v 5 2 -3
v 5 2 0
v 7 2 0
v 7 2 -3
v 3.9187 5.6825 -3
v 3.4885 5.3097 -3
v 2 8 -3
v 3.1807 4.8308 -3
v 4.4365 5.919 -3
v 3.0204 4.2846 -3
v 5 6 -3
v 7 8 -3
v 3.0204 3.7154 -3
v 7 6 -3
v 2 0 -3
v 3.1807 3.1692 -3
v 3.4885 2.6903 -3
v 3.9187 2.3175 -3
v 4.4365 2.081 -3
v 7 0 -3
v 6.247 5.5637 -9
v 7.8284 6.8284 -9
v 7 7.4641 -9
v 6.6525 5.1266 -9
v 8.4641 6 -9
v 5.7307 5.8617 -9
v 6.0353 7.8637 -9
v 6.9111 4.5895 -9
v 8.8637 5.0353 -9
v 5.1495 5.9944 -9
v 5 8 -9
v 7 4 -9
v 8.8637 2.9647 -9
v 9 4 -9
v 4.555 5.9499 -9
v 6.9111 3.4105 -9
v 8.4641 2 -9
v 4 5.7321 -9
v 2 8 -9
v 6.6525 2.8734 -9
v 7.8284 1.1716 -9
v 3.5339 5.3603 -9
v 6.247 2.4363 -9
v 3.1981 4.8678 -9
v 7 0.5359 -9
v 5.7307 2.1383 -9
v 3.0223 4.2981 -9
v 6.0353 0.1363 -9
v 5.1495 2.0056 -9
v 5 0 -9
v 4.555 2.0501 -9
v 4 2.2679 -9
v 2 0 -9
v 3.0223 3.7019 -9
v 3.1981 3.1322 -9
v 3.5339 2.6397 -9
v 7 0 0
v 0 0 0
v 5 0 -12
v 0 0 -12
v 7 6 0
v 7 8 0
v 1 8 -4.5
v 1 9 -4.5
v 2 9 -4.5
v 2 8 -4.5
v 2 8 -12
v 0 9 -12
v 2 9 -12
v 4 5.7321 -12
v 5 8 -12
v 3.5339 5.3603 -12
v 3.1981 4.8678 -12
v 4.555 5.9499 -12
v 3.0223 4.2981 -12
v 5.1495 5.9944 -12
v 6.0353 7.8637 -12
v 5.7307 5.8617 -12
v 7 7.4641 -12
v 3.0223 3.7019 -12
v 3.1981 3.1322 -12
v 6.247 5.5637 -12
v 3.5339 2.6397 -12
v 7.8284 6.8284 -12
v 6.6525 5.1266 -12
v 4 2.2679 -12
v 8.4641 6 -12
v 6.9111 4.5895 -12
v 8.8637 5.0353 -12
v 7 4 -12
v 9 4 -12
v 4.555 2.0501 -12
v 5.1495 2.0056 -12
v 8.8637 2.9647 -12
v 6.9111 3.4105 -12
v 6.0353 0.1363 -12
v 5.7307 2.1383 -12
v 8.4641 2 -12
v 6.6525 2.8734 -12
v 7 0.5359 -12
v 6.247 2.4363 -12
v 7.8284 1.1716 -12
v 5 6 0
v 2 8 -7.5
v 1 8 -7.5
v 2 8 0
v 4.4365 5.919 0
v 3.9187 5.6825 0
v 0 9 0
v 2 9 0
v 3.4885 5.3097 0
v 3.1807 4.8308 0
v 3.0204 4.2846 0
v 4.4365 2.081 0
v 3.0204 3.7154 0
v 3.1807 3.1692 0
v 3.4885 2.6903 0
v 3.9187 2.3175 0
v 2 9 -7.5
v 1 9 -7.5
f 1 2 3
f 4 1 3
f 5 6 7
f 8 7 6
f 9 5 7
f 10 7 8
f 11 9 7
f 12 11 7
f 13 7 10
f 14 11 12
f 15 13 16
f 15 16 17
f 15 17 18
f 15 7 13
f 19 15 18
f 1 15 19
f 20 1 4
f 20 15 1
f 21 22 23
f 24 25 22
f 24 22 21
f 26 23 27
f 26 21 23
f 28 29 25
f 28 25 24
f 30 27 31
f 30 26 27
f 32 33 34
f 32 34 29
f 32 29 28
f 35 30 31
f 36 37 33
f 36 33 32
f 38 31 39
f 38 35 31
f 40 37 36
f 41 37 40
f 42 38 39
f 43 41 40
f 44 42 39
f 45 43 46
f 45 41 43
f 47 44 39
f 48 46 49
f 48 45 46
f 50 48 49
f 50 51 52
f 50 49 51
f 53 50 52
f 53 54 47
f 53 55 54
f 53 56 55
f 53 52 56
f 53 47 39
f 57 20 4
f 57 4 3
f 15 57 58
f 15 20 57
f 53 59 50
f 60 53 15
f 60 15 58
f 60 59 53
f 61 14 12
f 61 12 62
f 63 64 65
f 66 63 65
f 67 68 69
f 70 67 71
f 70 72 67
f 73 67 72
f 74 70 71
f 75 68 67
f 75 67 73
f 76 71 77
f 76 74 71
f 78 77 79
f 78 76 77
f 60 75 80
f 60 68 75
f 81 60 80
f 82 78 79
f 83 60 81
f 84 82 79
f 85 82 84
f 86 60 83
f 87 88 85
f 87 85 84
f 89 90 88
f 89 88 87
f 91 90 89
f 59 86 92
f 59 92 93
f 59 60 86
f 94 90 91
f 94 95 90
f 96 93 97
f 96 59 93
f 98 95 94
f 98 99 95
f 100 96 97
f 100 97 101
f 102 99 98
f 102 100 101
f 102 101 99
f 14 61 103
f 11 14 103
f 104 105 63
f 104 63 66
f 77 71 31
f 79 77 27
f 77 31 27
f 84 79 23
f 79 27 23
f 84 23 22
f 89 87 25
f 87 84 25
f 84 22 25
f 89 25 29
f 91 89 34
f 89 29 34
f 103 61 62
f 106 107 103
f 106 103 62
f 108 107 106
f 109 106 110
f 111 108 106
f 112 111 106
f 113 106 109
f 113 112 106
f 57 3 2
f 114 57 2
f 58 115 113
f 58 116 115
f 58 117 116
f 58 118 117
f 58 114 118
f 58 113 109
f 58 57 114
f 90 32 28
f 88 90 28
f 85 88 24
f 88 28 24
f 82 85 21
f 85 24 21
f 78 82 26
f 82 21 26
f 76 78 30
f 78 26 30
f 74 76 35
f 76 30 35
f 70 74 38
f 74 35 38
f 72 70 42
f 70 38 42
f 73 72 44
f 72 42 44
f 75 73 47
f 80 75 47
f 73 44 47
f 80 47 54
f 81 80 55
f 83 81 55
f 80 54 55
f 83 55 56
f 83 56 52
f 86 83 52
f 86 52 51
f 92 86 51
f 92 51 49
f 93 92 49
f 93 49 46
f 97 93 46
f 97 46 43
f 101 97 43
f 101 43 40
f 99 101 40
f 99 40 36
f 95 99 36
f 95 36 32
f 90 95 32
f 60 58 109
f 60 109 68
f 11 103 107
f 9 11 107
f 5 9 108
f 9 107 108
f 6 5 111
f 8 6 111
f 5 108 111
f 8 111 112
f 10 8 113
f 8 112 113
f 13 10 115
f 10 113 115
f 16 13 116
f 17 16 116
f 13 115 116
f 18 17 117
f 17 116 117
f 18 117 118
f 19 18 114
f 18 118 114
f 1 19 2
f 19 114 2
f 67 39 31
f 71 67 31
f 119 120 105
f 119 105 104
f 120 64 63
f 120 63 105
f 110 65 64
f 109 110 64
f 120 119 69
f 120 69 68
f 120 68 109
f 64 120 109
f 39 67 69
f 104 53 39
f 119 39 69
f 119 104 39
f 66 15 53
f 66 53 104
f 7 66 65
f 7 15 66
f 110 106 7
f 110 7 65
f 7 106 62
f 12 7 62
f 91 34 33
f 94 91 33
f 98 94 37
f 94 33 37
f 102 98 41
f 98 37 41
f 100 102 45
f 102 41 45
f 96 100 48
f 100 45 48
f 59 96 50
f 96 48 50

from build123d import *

# Parameters (mm, degrees)
BOSS_EXTRUDE1_DEPTH = 9
SKETCH3_R           = 2
SKETCH3_W           = 7
SKETCH3_H           = 1
CUT_EXTRUDE4_DEPTH  = 8
SKETCH4_W           = 1
SKETCH4_H           = 3
CUT_EXTRUDE5_DEPTH  = 1
SKETCH5_R           = 2
CUT_EXTRUDE6_DEPTH  = 11


with BuildPart() as part:
    # Sketch2 → Boss-Extrude1 (new body)
    with BuildSketch(Plane(origin=(0, 0, 0), x_dir=(1, 0, 0), z_dir=(0, 1, 0))):
        Polygon((0, 0), (0, 12), (9, 12), (9, 9), (2, 9), (2, 3), (7, 3), (7, 0), align=None)
    extrude(amount=BOSS_EXTRUDE1_DEPTH)

    # Sketch3 → Cut-Extrude4 (cut)
    with BuildSketch(Plane.XY):
        Polygon((8.855862573, 6), (7, 6), (7, 4), (7, 2), (8.855862573, 2), align=None)
        with Locations((5, 4)):
            Circle(SKETCH3_R)
        with BuildLine():
            Line((7, 4), (7, 6))
            Line((7, 6), (5, 6))
            ThreePointArc((5, 6), (6.414213562, 5.414213562), (7, 4))
        make_face()
        with BuildLine():
            Line((7, 2), (7, 4))
            ThreePointArc((7, 4), (6.414213562, 2.585786438), (5, 2))
            Line((5, 2), (7, 2))
        make_face()
        with Locations((5.5, 8.5)):
            Rectangle(SKETCH3_W, SKETCH3_H)
    extrude(amount=-CUT_EXTRUDE4_DEPTH, mode=Mode.SUBTRACT)

    # Sketch4 → Cut-Extrude5 (cut)
    with BuildSketch(Plane(origin=(0, 9, 0), x_dir=(1, 0, 0), z_dir=(0, 1, 0))):
        with Locations((1.5, 6)):
            Rectangle(SKETCH4_W, SKETCH4_H)
    extrude(amount=-CUT_EXTRUDE5_DEPTH, mode=Mode.SUBTRACT)

    # Sketch5 → Cut-Extrude6 (cut)
    with BuildSketch(Plane.XY.offset(-9)):
        Polygon((9, 9), (2, 9), (2, 8), (5, 8), (9, 8), align=None)
        with Locations((5, 4)):
            Circle(SKETCH5_R)
        with BuildLine():
            Line((9, 4.000000022), (9, 8))
            Line((9, 8), (5, 8))
            ThreePointArc((5, 8), (7.828427117, 6.828427133), (9, 4.000000022))
        make_face()
        with BuildLine():
            Line((9, 0), (9, 4.000000022))
            ThreePointArc((9, 4.000000022), (7.828427133, 1.171572883), (5, 0))
            Line((5, 0), (9, 0))
        make_face()
    extrude(amount=-CUT_EXTRUDE6_DEPTH, mode=Mode.SUBTRACT)


solid = part.part
